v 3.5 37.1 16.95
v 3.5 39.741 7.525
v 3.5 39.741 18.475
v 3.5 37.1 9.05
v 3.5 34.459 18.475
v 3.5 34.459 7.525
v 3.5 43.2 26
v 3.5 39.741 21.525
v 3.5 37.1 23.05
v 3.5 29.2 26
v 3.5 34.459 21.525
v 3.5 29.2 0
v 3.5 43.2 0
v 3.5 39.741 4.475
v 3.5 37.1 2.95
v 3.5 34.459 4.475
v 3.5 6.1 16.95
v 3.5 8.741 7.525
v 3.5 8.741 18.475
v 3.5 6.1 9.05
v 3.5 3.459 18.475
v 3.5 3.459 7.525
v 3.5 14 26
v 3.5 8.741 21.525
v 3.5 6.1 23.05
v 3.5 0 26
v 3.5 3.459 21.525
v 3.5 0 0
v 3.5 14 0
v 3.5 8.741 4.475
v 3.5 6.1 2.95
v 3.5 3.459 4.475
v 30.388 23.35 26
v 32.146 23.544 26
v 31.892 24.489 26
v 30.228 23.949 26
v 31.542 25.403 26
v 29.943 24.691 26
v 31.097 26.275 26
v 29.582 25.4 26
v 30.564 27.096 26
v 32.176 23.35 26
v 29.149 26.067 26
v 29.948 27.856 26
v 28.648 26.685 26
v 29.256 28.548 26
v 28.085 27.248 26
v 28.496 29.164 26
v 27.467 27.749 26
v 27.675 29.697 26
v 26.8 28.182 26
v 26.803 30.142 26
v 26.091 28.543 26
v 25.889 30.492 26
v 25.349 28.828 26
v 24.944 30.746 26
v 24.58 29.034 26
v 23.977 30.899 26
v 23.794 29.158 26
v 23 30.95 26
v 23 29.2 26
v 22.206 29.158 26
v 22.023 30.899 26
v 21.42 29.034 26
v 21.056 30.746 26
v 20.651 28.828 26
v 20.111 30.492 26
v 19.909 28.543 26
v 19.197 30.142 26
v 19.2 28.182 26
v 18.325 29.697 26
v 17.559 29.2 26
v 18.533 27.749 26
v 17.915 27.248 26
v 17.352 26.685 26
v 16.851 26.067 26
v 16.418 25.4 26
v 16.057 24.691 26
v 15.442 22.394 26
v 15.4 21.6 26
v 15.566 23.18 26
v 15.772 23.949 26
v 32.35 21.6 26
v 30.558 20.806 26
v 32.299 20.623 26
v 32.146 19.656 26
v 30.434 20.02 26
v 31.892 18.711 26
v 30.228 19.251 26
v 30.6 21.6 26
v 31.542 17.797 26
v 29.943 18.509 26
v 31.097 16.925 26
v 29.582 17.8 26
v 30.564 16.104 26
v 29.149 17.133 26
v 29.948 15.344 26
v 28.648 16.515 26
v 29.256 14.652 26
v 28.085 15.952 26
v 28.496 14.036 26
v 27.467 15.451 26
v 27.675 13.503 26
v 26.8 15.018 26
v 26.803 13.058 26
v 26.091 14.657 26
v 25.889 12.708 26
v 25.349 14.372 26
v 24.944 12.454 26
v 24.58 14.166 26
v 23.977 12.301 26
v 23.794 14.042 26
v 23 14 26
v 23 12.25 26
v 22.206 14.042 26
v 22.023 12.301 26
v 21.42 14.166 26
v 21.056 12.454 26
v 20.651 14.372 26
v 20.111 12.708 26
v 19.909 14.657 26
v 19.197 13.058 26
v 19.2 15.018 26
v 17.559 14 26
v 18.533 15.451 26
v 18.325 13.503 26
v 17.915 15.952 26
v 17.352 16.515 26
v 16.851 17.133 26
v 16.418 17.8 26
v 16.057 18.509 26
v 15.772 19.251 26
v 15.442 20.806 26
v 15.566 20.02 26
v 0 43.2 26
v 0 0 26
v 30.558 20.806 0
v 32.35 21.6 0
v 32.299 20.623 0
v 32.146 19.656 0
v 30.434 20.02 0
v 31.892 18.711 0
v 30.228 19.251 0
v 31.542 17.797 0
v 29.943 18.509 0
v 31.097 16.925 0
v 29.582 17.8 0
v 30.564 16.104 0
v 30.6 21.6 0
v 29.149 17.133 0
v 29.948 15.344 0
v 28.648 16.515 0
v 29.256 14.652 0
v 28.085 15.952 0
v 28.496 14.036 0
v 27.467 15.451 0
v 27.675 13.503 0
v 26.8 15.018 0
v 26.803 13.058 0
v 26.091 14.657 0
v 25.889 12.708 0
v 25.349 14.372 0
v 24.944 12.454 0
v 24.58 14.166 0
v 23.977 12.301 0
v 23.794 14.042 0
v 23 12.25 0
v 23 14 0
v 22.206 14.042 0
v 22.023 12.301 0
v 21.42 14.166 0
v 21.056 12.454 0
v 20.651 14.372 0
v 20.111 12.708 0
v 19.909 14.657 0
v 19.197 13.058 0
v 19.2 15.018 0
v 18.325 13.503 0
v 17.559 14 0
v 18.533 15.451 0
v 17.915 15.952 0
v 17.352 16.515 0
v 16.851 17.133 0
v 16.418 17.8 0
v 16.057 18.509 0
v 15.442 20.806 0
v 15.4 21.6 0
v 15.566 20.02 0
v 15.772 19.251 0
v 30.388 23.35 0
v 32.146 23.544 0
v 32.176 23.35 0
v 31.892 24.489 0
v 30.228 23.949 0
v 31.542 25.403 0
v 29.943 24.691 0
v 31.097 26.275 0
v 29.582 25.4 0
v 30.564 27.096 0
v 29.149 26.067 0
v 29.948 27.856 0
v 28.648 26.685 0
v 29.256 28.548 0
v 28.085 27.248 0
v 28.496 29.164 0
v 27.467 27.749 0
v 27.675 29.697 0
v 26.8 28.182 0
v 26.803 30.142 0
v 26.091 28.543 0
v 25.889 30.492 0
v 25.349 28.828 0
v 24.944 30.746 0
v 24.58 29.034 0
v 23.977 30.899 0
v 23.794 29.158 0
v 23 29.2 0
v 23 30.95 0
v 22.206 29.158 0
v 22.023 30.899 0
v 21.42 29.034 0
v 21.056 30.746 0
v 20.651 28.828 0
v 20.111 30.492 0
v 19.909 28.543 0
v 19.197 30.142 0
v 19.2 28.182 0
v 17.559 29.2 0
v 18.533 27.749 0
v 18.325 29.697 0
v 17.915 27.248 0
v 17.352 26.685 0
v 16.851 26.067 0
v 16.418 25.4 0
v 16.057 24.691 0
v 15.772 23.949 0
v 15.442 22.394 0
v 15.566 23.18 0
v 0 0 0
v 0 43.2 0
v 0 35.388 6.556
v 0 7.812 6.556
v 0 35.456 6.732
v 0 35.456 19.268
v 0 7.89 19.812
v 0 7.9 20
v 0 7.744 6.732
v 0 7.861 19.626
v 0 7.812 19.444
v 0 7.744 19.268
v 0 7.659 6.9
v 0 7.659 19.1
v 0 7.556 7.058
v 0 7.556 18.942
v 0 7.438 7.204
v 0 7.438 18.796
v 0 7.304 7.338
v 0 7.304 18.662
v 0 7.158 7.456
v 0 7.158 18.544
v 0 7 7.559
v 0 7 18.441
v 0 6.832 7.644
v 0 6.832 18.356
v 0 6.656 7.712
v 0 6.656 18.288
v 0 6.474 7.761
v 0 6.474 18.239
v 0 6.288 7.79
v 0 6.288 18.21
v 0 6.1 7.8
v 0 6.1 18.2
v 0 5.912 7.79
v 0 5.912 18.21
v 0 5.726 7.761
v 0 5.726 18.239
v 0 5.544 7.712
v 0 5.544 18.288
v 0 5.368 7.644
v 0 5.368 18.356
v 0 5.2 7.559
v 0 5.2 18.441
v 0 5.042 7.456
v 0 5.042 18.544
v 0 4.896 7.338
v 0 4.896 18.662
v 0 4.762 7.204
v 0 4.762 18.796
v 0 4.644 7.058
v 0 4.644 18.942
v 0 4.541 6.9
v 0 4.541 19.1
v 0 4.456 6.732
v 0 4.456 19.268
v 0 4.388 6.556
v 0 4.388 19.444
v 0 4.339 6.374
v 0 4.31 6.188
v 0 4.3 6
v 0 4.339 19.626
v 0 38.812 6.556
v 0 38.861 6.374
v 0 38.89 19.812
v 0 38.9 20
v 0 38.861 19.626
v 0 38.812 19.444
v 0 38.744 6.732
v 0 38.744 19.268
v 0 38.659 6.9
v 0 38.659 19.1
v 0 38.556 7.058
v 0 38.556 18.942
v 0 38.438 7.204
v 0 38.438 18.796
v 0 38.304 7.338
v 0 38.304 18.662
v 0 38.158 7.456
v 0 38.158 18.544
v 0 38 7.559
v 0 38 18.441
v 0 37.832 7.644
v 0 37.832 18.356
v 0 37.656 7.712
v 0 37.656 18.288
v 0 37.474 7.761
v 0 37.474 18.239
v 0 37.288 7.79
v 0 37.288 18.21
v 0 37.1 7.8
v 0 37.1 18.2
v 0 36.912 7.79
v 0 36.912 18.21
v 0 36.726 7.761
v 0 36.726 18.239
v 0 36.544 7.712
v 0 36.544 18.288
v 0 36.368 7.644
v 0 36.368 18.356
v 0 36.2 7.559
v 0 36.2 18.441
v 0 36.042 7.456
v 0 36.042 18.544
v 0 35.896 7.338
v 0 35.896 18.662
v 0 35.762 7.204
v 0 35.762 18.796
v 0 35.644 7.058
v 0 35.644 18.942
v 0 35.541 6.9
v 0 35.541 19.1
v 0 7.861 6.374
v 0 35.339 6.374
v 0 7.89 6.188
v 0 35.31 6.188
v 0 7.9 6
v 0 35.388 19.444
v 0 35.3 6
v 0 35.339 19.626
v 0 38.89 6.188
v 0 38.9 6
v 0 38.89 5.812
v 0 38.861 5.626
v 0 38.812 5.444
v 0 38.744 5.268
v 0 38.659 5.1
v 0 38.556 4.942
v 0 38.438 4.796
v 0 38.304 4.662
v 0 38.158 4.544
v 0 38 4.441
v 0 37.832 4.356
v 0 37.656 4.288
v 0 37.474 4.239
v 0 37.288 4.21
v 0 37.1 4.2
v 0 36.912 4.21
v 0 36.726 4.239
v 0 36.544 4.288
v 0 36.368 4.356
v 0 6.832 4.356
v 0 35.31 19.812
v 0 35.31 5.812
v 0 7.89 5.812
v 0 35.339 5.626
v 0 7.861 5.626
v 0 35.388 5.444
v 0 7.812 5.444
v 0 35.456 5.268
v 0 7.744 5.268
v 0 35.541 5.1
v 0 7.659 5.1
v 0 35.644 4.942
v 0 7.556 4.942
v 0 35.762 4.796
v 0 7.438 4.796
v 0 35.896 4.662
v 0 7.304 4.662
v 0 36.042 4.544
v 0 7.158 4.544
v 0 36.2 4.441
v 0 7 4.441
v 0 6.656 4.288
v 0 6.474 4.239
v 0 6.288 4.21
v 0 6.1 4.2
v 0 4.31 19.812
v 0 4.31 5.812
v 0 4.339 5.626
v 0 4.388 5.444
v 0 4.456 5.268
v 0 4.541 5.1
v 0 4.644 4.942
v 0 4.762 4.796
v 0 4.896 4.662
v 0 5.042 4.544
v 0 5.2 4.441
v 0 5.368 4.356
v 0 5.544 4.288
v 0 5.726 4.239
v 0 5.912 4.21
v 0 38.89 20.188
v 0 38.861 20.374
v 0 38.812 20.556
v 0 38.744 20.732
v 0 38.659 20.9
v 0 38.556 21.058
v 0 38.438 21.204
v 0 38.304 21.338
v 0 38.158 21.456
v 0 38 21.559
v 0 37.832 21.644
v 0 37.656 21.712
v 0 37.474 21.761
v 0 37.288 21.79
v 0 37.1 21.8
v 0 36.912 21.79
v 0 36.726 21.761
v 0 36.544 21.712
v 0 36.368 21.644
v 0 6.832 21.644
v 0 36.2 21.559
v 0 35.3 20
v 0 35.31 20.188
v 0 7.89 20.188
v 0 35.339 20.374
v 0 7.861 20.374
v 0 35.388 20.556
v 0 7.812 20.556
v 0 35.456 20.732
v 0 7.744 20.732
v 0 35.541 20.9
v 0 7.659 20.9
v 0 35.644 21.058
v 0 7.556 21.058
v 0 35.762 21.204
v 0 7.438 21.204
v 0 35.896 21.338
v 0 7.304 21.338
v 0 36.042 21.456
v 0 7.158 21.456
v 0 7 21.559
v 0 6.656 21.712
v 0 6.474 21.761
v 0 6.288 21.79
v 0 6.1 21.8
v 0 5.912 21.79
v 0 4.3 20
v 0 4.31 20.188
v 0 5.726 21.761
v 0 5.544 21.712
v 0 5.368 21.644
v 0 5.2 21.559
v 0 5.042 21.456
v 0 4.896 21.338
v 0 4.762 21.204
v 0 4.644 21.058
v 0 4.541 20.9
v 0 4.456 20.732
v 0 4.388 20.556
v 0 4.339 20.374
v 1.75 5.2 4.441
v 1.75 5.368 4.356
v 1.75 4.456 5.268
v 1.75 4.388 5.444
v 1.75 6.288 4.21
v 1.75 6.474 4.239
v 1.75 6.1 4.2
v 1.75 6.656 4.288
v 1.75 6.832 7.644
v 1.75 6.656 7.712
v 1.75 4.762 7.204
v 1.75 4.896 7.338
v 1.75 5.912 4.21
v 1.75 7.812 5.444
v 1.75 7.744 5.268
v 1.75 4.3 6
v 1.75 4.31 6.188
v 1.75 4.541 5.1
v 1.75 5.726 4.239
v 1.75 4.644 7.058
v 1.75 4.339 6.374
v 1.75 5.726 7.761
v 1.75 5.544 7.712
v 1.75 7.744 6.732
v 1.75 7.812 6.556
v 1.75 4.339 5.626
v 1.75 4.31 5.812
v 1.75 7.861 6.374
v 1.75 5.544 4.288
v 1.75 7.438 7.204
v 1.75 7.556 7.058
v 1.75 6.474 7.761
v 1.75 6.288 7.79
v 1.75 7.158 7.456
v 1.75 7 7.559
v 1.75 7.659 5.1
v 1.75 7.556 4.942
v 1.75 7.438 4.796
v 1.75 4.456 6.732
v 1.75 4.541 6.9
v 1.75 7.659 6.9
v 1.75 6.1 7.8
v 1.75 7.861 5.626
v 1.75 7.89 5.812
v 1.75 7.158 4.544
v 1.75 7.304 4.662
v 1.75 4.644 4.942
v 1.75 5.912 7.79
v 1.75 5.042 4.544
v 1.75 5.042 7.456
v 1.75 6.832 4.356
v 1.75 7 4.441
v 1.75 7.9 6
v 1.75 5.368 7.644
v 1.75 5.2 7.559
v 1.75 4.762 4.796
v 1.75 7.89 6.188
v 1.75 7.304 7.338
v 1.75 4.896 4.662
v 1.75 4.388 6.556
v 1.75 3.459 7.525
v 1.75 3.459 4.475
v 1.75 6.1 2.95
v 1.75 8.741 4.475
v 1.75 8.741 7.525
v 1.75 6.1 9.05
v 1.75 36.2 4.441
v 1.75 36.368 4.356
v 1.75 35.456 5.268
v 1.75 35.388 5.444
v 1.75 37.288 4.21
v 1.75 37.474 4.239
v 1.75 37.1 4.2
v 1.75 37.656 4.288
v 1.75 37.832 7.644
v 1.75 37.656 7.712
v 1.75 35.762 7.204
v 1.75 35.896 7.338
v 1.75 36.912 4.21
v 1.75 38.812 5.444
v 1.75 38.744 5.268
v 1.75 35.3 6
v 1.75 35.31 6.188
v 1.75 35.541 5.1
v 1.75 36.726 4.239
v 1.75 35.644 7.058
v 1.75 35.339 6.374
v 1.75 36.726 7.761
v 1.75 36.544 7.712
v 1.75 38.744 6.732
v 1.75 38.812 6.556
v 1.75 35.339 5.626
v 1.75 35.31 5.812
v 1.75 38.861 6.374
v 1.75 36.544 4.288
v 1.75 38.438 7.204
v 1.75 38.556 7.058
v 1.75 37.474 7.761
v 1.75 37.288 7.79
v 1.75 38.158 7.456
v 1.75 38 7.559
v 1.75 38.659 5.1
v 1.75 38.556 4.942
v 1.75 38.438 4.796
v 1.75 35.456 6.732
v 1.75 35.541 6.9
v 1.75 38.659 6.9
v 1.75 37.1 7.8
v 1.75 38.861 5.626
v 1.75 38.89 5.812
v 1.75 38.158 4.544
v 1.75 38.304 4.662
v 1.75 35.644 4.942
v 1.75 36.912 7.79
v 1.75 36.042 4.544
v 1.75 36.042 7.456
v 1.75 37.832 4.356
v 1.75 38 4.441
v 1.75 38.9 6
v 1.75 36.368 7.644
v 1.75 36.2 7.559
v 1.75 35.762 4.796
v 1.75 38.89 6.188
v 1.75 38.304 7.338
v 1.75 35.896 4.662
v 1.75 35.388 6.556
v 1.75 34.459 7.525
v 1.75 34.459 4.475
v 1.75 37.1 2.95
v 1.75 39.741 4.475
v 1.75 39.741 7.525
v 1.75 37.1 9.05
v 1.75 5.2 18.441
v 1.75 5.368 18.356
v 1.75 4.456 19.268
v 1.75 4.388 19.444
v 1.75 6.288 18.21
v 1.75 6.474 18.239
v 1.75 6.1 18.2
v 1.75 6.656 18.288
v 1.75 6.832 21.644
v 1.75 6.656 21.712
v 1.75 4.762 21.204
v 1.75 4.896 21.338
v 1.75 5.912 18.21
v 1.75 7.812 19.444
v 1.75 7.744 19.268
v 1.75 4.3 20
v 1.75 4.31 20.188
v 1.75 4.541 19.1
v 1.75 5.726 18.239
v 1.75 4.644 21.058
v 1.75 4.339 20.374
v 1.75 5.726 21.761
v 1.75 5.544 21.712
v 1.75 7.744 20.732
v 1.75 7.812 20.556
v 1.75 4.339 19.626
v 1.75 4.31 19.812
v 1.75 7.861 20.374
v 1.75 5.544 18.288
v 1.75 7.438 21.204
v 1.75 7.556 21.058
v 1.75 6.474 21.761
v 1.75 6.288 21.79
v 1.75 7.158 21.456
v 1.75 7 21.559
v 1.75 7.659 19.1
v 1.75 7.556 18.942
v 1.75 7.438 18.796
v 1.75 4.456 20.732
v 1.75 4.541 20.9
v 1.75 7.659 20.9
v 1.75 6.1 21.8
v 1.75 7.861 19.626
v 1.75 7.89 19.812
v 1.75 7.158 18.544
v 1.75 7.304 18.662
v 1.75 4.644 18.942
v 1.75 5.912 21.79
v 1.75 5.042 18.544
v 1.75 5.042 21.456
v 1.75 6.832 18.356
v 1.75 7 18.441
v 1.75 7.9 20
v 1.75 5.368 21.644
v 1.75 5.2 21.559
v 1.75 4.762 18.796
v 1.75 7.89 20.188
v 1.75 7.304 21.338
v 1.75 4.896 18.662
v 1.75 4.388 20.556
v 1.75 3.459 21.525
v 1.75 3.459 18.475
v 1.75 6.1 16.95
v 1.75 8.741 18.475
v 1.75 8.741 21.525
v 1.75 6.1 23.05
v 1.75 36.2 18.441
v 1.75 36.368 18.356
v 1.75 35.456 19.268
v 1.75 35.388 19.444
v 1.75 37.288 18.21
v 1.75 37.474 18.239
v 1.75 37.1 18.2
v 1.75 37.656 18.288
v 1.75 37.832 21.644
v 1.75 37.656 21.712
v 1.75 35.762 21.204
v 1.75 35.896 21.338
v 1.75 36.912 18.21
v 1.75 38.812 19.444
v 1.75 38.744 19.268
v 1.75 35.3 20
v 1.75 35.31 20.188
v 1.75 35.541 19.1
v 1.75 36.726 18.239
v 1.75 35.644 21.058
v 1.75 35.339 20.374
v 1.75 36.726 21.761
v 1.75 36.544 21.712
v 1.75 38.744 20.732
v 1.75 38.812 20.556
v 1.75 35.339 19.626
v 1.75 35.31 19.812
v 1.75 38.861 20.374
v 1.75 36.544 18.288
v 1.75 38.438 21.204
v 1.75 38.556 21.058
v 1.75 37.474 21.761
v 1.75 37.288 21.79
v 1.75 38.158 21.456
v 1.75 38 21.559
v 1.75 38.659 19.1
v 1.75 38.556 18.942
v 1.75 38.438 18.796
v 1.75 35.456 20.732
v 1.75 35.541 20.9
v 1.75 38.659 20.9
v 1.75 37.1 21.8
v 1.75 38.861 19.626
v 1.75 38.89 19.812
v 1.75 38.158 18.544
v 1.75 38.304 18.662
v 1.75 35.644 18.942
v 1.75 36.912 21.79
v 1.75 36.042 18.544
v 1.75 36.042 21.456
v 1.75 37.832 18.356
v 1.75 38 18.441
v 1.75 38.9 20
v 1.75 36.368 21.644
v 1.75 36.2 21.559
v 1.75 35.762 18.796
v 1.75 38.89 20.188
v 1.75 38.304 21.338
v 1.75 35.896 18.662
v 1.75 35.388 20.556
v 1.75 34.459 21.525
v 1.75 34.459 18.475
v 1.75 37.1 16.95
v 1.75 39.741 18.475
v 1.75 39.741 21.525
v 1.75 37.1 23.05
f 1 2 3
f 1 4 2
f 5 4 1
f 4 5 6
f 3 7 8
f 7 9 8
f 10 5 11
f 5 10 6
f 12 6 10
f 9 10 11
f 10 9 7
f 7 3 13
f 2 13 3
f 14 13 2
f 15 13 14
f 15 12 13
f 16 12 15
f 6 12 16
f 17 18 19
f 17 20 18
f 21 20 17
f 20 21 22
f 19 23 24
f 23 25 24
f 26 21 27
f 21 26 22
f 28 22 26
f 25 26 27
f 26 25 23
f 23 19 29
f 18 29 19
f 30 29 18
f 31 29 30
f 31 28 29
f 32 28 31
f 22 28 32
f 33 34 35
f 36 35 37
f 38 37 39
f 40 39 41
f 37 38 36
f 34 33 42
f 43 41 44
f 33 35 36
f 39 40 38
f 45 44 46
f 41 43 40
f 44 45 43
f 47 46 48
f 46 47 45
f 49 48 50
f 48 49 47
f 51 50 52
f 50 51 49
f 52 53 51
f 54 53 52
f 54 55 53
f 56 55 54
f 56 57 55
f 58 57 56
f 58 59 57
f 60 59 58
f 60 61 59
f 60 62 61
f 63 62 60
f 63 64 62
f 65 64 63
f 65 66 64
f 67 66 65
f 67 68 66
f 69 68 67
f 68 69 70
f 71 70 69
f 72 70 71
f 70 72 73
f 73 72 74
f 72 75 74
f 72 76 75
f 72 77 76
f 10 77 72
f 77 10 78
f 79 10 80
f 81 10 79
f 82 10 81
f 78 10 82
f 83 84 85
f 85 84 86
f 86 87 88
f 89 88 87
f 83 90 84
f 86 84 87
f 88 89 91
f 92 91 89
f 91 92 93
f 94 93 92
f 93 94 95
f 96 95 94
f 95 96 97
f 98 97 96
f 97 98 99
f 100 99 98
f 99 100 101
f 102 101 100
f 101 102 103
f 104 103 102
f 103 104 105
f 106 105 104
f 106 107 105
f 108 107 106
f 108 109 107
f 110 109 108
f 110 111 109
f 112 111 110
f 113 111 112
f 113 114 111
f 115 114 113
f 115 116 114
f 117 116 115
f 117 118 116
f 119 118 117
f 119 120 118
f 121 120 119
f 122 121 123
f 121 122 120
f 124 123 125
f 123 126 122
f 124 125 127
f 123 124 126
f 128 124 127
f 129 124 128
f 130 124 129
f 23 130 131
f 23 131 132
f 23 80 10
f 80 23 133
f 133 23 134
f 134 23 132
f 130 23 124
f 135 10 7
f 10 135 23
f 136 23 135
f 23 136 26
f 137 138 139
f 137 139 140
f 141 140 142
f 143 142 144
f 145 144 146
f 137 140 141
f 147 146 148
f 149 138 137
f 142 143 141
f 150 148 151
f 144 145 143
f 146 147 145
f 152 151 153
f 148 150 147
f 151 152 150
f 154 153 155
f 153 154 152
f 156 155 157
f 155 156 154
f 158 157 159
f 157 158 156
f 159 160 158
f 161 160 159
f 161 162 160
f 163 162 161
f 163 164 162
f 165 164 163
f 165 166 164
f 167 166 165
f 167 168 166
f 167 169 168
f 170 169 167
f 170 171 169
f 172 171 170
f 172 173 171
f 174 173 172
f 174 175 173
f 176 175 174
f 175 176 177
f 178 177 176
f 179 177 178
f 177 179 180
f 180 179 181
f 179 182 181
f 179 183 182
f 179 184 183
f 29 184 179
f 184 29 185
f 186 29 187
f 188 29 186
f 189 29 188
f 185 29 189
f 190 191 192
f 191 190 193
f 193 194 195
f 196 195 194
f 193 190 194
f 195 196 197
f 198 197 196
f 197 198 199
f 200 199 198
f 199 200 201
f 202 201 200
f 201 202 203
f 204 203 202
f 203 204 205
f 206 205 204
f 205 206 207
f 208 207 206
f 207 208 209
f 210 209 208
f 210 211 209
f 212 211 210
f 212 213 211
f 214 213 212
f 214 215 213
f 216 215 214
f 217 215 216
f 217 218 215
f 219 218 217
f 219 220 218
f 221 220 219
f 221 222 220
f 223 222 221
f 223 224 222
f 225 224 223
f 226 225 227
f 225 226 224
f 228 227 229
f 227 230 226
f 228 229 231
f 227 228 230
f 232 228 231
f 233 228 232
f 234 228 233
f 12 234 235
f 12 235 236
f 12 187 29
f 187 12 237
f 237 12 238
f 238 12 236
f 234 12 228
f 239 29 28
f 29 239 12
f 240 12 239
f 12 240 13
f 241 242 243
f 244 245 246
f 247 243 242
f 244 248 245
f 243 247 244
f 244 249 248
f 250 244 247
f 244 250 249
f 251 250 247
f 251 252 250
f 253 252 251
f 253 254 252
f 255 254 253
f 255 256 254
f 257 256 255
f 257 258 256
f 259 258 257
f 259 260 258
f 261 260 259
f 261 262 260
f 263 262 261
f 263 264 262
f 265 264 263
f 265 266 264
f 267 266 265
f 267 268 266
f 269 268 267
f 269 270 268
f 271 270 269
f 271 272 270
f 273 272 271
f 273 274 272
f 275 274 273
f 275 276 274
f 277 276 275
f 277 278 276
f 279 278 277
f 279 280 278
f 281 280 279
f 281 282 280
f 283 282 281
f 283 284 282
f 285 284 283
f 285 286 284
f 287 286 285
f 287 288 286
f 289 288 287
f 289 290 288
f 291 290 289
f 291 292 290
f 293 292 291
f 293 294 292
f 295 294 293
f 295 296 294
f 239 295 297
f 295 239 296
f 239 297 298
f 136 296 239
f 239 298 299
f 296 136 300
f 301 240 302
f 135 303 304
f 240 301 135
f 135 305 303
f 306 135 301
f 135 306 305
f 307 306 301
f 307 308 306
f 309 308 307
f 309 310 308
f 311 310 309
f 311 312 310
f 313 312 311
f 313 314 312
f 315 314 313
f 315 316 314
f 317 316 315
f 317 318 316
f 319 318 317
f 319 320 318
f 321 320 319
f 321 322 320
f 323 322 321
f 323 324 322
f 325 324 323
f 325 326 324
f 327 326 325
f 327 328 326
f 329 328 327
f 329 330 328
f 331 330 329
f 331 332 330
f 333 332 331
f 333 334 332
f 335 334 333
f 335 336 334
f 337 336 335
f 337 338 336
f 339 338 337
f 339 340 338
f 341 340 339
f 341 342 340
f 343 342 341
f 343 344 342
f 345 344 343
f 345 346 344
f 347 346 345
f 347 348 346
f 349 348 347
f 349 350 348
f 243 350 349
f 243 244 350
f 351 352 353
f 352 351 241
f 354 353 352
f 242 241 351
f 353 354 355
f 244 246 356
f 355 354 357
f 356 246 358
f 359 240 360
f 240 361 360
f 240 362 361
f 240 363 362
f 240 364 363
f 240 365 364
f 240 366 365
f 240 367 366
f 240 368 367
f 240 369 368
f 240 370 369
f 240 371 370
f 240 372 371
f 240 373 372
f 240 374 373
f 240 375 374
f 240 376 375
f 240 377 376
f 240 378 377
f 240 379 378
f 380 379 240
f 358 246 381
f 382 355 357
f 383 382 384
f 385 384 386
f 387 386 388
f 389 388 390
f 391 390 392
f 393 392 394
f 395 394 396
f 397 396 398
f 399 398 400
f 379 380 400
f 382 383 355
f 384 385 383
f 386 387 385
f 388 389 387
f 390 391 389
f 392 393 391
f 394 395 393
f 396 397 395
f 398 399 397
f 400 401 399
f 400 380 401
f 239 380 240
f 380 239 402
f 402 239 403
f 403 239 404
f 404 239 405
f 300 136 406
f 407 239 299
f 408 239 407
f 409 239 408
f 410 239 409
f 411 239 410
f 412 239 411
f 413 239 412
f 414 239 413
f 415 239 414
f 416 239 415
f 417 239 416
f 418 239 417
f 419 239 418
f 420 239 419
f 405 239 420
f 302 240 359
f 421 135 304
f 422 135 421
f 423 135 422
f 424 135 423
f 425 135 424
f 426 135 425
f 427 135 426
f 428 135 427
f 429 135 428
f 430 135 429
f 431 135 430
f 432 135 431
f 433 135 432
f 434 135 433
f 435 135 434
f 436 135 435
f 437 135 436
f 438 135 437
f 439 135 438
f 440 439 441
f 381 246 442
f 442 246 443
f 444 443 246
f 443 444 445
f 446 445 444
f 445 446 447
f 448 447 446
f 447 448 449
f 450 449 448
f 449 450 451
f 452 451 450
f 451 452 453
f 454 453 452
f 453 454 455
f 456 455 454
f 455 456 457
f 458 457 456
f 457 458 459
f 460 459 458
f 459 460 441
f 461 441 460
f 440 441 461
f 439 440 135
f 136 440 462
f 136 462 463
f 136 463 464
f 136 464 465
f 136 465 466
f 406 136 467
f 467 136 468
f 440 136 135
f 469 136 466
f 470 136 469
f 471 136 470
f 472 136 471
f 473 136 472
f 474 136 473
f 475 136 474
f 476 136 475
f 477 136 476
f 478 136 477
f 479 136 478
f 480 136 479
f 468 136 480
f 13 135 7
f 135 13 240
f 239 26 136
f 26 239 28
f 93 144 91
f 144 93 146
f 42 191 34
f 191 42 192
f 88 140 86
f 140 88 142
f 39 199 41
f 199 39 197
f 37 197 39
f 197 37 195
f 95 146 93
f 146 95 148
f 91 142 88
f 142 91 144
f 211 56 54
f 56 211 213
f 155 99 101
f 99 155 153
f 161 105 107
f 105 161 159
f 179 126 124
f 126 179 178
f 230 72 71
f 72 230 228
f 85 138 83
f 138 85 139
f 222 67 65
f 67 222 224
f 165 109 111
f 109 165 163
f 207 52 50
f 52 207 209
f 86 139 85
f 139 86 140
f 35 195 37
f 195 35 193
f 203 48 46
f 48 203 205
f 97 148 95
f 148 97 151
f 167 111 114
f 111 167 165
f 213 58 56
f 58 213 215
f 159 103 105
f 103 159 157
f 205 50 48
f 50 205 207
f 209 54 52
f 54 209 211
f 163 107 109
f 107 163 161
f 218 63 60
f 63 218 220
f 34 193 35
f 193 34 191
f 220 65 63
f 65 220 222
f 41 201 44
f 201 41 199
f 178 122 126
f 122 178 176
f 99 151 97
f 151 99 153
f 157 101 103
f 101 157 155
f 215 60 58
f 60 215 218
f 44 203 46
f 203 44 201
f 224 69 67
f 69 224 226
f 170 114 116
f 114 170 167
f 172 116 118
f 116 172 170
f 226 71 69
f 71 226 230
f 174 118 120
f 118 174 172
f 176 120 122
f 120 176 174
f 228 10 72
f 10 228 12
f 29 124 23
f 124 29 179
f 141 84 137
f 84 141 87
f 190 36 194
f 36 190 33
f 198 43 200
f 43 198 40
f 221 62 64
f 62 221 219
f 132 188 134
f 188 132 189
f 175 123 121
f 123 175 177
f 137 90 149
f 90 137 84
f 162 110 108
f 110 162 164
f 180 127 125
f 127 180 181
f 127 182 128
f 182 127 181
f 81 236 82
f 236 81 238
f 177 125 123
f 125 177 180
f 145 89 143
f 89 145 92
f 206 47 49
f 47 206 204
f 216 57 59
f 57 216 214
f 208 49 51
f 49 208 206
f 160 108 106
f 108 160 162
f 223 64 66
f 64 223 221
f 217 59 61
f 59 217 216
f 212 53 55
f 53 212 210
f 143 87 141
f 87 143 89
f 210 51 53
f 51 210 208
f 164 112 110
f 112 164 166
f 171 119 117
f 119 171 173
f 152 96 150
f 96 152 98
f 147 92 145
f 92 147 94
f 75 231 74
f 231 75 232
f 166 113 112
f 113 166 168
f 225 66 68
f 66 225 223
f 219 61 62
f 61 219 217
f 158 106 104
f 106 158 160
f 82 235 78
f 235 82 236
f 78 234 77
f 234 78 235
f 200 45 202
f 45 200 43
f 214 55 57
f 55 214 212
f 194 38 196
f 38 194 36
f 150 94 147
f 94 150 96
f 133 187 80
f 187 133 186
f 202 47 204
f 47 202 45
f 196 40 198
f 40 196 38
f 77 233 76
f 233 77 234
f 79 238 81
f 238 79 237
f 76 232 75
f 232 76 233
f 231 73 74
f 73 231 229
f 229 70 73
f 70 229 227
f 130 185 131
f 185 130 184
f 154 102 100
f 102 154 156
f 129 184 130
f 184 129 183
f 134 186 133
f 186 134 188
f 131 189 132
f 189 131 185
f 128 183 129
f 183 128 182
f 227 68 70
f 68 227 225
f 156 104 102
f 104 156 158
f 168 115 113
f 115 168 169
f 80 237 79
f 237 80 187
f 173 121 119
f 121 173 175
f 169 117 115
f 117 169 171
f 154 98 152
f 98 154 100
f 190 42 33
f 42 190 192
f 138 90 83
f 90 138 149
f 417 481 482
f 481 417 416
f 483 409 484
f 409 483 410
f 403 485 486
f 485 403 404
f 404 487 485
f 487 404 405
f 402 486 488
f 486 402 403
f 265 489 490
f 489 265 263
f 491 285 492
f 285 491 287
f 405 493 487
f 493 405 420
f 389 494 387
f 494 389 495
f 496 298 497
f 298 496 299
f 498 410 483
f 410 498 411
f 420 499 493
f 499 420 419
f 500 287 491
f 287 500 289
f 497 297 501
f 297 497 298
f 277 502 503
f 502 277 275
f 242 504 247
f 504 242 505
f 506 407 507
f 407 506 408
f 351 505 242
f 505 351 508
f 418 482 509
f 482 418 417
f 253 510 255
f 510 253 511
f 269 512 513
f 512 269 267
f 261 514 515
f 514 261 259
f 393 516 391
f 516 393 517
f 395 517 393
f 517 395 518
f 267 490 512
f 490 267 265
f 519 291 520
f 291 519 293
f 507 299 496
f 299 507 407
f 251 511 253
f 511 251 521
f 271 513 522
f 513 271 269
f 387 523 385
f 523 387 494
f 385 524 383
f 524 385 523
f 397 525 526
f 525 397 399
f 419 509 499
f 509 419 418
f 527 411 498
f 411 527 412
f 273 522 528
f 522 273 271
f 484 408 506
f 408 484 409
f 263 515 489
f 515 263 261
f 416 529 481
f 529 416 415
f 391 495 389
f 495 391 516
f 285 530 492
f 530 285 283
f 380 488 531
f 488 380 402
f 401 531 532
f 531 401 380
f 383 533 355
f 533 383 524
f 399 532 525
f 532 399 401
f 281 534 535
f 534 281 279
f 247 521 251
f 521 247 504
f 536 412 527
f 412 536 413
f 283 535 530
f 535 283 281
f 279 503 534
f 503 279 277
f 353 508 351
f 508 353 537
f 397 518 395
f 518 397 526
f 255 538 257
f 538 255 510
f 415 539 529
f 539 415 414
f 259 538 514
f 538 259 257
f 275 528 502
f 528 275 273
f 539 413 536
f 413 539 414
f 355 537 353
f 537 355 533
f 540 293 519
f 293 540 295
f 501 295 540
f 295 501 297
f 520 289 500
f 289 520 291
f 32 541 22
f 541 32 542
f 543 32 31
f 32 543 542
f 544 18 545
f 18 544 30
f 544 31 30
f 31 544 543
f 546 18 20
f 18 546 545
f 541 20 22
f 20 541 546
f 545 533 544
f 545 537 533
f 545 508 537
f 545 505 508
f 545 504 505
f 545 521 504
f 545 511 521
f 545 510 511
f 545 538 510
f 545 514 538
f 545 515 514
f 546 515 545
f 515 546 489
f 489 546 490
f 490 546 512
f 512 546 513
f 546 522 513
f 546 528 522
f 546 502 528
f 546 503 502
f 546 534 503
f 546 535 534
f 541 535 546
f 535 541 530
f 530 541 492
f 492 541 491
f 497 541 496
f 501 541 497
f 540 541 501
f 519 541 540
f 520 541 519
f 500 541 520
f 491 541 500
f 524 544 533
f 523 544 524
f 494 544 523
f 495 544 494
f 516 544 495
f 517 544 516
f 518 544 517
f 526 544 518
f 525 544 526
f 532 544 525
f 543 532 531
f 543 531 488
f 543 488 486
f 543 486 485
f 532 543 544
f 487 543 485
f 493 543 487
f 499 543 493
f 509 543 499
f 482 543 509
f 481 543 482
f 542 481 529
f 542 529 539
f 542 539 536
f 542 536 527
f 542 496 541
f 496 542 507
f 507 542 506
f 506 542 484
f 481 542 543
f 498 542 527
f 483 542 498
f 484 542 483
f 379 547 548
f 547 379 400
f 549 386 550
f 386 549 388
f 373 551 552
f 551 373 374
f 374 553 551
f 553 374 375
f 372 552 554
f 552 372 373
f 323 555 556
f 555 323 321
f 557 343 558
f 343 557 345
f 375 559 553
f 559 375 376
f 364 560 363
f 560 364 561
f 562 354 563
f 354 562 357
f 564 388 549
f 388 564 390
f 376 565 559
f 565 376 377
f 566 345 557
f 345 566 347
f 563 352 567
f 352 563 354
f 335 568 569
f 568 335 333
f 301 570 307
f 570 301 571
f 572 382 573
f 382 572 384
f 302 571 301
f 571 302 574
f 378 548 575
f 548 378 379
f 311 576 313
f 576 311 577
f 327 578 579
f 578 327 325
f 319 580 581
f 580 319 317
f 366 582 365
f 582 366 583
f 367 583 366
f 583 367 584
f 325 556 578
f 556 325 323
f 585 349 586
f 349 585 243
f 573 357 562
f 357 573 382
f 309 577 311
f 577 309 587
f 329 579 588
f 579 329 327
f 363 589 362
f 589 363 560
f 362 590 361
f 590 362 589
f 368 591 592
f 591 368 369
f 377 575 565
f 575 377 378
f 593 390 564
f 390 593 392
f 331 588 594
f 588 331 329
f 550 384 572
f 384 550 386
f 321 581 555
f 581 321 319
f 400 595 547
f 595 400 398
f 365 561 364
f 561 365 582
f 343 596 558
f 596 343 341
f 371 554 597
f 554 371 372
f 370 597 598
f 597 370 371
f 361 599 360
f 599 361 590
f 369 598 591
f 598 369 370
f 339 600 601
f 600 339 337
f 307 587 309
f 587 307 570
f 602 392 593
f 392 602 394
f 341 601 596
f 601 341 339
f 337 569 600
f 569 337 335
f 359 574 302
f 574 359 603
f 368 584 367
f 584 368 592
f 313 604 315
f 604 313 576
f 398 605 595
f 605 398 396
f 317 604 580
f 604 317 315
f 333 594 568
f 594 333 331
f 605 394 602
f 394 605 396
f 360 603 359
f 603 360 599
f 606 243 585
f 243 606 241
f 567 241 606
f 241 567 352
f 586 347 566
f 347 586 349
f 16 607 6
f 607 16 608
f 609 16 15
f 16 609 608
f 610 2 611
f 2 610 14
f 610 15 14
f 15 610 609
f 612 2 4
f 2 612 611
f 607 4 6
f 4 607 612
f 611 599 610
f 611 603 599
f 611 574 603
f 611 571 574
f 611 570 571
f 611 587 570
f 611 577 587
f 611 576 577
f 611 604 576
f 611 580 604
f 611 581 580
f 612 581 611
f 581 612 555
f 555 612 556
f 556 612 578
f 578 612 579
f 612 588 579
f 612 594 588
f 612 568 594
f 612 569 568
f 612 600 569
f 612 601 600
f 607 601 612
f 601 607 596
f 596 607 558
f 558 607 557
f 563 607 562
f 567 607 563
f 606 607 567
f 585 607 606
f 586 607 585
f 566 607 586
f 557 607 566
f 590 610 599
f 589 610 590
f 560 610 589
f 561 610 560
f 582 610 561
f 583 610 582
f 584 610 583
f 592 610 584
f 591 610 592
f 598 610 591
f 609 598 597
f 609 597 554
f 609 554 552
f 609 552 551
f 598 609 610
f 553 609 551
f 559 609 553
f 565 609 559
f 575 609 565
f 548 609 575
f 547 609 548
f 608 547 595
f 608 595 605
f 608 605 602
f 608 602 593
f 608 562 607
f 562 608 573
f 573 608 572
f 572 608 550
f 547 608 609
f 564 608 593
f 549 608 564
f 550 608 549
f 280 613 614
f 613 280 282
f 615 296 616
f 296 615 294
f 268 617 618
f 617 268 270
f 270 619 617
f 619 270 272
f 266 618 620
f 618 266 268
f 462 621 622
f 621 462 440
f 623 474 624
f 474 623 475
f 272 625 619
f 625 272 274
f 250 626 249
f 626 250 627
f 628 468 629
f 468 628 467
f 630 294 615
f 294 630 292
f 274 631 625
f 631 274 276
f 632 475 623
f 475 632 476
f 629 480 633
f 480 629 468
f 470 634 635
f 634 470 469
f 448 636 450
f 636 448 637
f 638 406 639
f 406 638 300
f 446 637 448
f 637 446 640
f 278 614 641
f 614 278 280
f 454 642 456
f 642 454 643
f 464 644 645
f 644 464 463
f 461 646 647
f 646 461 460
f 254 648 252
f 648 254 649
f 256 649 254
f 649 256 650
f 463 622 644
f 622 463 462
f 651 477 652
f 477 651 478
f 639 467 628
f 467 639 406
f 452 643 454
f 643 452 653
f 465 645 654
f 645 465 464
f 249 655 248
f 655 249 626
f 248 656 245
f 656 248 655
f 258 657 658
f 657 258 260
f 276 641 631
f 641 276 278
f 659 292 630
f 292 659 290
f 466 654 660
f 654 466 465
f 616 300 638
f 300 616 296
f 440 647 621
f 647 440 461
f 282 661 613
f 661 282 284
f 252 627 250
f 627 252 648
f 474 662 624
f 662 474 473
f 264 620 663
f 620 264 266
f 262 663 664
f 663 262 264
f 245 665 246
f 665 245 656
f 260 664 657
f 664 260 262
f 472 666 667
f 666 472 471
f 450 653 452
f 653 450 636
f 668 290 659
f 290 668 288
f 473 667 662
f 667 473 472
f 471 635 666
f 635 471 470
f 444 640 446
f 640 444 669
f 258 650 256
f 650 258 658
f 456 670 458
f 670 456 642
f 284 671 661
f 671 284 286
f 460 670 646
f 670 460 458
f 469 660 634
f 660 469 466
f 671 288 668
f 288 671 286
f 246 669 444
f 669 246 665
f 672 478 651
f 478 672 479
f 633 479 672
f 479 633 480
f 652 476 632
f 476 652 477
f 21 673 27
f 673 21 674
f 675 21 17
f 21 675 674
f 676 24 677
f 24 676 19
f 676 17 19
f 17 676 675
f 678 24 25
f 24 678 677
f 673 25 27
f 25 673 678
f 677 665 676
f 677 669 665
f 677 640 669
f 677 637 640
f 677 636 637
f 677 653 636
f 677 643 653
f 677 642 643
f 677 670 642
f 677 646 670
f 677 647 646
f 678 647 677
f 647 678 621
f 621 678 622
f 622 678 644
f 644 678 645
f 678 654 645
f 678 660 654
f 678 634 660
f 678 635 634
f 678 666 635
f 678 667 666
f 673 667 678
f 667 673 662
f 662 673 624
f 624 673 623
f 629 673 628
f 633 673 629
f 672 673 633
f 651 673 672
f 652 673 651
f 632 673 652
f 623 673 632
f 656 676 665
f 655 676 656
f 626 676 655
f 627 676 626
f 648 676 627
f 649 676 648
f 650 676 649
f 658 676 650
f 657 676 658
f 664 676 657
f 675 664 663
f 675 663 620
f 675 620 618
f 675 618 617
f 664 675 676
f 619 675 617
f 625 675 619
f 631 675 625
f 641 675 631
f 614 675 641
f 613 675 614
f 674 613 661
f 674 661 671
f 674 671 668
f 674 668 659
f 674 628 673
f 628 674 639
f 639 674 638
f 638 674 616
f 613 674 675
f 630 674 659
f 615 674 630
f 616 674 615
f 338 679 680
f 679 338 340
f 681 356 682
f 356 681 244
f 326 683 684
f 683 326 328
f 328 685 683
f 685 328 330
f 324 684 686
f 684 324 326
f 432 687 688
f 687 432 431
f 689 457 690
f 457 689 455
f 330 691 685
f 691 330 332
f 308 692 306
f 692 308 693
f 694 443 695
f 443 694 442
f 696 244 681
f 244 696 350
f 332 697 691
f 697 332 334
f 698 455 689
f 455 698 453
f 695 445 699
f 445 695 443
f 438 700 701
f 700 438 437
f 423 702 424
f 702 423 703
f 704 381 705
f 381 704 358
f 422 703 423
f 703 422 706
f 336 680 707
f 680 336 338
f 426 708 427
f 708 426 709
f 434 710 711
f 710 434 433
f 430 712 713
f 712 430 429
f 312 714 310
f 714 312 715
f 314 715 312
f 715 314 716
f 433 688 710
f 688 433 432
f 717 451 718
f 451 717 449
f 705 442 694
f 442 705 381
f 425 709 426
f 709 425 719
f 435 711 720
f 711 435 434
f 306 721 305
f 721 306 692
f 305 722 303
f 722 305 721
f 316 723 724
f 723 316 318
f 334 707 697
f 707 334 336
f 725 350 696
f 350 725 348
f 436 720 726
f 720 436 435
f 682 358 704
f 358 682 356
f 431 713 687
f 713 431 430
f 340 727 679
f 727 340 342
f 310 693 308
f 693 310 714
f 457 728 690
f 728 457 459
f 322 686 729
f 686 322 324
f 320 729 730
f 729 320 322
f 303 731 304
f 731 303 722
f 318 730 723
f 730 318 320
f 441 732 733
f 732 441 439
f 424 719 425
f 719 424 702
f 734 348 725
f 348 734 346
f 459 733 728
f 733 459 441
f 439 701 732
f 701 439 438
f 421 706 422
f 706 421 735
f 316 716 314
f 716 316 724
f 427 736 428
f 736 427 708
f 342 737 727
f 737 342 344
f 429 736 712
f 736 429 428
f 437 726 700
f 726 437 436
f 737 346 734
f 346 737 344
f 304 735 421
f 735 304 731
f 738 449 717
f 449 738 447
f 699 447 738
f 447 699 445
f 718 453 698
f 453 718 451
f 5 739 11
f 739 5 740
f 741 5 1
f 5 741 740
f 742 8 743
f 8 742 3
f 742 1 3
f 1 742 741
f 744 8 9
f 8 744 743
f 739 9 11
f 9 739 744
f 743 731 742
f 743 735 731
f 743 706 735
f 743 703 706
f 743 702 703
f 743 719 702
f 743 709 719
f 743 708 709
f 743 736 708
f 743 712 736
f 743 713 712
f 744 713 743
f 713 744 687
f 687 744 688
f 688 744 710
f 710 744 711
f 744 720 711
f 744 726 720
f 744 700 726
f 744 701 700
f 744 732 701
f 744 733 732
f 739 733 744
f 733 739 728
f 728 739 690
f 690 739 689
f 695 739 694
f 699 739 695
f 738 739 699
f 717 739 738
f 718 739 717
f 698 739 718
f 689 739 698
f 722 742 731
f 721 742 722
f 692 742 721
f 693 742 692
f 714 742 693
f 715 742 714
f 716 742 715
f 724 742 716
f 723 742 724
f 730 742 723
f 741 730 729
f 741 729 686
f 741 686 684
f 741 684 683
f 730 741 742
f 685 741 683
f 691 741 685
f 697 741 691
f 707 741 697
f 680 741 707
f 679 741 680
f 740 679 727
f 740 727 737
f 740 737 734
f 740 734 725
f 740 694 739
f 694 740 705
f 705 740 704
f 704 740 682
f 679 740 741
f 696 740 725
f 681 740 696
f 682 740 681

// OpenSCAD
/*
 * y lm8uu
 *
 * Mount bed directly on y-rods. Reduces moving mass, ensures rigidity,
 * increases print height.
 * 
 * Copyright 2012 <b@Zi.iS>
 * License GPLv2
 *
 */
$fn = 60;

m3 = [
	3.6/2, //bolt
	6.1 /2, //nut
];
lm8uu = [
	26, //length
	15.2/2, //outside
];

mount();

module mount(
	bearing = 	lm8uu,
	height = 23, //center of rail to bottom of bed
	mount = [
		31,
		14,
		m3,
	],
	thickness = 1.75,
) {
	size = [
		thickness*2,
		mount[0] + mount[2][1]*4,
		bearing[0],
	];

	difference() {
		union() {
			cube(size);
			translate([
				height,
				size[1]/2,
				0,
			]) {
				cylinder(
					r = bearing[1] + thickness,
					h = bearing[0]
				);
			}
			translate([
				0,
				size[1]/2 - bearing[1],
				0,
			]) {
				cube([
					height,
					bearing[1] * 2,
					bearing[0]
				]);
			}
		}
		translate([
			height,
			size[1]/2,
			-1,
		]) {
			cylinder(
				r = bearing[1],
				h = bearing[0] + 2
			);
			cube([
				100,
				thickness,
				bearing[0] + 2,
			]);
		}
		for(x=[0:1]) {
			for(y=[0:1]) {
				rotate([
					90,
					90,
					90,
				]) {
					translate([
						-(size[2] - mount[1])/2 - mount[1]*x,
						mount[2][1]*2 +mount[0]*y,
						-1,
					]) {
						cylinder(
							r = mount[2][0],
							h = thickness*2 + 2
						);
						translate([
							0,
							0,
							1 + thickness
						]) {
							cylinder(
								r = mount[2][1],
								h = thickness+2,
								$fn=6
							);
						}	
					}
				}
			}
		}
	}
}
